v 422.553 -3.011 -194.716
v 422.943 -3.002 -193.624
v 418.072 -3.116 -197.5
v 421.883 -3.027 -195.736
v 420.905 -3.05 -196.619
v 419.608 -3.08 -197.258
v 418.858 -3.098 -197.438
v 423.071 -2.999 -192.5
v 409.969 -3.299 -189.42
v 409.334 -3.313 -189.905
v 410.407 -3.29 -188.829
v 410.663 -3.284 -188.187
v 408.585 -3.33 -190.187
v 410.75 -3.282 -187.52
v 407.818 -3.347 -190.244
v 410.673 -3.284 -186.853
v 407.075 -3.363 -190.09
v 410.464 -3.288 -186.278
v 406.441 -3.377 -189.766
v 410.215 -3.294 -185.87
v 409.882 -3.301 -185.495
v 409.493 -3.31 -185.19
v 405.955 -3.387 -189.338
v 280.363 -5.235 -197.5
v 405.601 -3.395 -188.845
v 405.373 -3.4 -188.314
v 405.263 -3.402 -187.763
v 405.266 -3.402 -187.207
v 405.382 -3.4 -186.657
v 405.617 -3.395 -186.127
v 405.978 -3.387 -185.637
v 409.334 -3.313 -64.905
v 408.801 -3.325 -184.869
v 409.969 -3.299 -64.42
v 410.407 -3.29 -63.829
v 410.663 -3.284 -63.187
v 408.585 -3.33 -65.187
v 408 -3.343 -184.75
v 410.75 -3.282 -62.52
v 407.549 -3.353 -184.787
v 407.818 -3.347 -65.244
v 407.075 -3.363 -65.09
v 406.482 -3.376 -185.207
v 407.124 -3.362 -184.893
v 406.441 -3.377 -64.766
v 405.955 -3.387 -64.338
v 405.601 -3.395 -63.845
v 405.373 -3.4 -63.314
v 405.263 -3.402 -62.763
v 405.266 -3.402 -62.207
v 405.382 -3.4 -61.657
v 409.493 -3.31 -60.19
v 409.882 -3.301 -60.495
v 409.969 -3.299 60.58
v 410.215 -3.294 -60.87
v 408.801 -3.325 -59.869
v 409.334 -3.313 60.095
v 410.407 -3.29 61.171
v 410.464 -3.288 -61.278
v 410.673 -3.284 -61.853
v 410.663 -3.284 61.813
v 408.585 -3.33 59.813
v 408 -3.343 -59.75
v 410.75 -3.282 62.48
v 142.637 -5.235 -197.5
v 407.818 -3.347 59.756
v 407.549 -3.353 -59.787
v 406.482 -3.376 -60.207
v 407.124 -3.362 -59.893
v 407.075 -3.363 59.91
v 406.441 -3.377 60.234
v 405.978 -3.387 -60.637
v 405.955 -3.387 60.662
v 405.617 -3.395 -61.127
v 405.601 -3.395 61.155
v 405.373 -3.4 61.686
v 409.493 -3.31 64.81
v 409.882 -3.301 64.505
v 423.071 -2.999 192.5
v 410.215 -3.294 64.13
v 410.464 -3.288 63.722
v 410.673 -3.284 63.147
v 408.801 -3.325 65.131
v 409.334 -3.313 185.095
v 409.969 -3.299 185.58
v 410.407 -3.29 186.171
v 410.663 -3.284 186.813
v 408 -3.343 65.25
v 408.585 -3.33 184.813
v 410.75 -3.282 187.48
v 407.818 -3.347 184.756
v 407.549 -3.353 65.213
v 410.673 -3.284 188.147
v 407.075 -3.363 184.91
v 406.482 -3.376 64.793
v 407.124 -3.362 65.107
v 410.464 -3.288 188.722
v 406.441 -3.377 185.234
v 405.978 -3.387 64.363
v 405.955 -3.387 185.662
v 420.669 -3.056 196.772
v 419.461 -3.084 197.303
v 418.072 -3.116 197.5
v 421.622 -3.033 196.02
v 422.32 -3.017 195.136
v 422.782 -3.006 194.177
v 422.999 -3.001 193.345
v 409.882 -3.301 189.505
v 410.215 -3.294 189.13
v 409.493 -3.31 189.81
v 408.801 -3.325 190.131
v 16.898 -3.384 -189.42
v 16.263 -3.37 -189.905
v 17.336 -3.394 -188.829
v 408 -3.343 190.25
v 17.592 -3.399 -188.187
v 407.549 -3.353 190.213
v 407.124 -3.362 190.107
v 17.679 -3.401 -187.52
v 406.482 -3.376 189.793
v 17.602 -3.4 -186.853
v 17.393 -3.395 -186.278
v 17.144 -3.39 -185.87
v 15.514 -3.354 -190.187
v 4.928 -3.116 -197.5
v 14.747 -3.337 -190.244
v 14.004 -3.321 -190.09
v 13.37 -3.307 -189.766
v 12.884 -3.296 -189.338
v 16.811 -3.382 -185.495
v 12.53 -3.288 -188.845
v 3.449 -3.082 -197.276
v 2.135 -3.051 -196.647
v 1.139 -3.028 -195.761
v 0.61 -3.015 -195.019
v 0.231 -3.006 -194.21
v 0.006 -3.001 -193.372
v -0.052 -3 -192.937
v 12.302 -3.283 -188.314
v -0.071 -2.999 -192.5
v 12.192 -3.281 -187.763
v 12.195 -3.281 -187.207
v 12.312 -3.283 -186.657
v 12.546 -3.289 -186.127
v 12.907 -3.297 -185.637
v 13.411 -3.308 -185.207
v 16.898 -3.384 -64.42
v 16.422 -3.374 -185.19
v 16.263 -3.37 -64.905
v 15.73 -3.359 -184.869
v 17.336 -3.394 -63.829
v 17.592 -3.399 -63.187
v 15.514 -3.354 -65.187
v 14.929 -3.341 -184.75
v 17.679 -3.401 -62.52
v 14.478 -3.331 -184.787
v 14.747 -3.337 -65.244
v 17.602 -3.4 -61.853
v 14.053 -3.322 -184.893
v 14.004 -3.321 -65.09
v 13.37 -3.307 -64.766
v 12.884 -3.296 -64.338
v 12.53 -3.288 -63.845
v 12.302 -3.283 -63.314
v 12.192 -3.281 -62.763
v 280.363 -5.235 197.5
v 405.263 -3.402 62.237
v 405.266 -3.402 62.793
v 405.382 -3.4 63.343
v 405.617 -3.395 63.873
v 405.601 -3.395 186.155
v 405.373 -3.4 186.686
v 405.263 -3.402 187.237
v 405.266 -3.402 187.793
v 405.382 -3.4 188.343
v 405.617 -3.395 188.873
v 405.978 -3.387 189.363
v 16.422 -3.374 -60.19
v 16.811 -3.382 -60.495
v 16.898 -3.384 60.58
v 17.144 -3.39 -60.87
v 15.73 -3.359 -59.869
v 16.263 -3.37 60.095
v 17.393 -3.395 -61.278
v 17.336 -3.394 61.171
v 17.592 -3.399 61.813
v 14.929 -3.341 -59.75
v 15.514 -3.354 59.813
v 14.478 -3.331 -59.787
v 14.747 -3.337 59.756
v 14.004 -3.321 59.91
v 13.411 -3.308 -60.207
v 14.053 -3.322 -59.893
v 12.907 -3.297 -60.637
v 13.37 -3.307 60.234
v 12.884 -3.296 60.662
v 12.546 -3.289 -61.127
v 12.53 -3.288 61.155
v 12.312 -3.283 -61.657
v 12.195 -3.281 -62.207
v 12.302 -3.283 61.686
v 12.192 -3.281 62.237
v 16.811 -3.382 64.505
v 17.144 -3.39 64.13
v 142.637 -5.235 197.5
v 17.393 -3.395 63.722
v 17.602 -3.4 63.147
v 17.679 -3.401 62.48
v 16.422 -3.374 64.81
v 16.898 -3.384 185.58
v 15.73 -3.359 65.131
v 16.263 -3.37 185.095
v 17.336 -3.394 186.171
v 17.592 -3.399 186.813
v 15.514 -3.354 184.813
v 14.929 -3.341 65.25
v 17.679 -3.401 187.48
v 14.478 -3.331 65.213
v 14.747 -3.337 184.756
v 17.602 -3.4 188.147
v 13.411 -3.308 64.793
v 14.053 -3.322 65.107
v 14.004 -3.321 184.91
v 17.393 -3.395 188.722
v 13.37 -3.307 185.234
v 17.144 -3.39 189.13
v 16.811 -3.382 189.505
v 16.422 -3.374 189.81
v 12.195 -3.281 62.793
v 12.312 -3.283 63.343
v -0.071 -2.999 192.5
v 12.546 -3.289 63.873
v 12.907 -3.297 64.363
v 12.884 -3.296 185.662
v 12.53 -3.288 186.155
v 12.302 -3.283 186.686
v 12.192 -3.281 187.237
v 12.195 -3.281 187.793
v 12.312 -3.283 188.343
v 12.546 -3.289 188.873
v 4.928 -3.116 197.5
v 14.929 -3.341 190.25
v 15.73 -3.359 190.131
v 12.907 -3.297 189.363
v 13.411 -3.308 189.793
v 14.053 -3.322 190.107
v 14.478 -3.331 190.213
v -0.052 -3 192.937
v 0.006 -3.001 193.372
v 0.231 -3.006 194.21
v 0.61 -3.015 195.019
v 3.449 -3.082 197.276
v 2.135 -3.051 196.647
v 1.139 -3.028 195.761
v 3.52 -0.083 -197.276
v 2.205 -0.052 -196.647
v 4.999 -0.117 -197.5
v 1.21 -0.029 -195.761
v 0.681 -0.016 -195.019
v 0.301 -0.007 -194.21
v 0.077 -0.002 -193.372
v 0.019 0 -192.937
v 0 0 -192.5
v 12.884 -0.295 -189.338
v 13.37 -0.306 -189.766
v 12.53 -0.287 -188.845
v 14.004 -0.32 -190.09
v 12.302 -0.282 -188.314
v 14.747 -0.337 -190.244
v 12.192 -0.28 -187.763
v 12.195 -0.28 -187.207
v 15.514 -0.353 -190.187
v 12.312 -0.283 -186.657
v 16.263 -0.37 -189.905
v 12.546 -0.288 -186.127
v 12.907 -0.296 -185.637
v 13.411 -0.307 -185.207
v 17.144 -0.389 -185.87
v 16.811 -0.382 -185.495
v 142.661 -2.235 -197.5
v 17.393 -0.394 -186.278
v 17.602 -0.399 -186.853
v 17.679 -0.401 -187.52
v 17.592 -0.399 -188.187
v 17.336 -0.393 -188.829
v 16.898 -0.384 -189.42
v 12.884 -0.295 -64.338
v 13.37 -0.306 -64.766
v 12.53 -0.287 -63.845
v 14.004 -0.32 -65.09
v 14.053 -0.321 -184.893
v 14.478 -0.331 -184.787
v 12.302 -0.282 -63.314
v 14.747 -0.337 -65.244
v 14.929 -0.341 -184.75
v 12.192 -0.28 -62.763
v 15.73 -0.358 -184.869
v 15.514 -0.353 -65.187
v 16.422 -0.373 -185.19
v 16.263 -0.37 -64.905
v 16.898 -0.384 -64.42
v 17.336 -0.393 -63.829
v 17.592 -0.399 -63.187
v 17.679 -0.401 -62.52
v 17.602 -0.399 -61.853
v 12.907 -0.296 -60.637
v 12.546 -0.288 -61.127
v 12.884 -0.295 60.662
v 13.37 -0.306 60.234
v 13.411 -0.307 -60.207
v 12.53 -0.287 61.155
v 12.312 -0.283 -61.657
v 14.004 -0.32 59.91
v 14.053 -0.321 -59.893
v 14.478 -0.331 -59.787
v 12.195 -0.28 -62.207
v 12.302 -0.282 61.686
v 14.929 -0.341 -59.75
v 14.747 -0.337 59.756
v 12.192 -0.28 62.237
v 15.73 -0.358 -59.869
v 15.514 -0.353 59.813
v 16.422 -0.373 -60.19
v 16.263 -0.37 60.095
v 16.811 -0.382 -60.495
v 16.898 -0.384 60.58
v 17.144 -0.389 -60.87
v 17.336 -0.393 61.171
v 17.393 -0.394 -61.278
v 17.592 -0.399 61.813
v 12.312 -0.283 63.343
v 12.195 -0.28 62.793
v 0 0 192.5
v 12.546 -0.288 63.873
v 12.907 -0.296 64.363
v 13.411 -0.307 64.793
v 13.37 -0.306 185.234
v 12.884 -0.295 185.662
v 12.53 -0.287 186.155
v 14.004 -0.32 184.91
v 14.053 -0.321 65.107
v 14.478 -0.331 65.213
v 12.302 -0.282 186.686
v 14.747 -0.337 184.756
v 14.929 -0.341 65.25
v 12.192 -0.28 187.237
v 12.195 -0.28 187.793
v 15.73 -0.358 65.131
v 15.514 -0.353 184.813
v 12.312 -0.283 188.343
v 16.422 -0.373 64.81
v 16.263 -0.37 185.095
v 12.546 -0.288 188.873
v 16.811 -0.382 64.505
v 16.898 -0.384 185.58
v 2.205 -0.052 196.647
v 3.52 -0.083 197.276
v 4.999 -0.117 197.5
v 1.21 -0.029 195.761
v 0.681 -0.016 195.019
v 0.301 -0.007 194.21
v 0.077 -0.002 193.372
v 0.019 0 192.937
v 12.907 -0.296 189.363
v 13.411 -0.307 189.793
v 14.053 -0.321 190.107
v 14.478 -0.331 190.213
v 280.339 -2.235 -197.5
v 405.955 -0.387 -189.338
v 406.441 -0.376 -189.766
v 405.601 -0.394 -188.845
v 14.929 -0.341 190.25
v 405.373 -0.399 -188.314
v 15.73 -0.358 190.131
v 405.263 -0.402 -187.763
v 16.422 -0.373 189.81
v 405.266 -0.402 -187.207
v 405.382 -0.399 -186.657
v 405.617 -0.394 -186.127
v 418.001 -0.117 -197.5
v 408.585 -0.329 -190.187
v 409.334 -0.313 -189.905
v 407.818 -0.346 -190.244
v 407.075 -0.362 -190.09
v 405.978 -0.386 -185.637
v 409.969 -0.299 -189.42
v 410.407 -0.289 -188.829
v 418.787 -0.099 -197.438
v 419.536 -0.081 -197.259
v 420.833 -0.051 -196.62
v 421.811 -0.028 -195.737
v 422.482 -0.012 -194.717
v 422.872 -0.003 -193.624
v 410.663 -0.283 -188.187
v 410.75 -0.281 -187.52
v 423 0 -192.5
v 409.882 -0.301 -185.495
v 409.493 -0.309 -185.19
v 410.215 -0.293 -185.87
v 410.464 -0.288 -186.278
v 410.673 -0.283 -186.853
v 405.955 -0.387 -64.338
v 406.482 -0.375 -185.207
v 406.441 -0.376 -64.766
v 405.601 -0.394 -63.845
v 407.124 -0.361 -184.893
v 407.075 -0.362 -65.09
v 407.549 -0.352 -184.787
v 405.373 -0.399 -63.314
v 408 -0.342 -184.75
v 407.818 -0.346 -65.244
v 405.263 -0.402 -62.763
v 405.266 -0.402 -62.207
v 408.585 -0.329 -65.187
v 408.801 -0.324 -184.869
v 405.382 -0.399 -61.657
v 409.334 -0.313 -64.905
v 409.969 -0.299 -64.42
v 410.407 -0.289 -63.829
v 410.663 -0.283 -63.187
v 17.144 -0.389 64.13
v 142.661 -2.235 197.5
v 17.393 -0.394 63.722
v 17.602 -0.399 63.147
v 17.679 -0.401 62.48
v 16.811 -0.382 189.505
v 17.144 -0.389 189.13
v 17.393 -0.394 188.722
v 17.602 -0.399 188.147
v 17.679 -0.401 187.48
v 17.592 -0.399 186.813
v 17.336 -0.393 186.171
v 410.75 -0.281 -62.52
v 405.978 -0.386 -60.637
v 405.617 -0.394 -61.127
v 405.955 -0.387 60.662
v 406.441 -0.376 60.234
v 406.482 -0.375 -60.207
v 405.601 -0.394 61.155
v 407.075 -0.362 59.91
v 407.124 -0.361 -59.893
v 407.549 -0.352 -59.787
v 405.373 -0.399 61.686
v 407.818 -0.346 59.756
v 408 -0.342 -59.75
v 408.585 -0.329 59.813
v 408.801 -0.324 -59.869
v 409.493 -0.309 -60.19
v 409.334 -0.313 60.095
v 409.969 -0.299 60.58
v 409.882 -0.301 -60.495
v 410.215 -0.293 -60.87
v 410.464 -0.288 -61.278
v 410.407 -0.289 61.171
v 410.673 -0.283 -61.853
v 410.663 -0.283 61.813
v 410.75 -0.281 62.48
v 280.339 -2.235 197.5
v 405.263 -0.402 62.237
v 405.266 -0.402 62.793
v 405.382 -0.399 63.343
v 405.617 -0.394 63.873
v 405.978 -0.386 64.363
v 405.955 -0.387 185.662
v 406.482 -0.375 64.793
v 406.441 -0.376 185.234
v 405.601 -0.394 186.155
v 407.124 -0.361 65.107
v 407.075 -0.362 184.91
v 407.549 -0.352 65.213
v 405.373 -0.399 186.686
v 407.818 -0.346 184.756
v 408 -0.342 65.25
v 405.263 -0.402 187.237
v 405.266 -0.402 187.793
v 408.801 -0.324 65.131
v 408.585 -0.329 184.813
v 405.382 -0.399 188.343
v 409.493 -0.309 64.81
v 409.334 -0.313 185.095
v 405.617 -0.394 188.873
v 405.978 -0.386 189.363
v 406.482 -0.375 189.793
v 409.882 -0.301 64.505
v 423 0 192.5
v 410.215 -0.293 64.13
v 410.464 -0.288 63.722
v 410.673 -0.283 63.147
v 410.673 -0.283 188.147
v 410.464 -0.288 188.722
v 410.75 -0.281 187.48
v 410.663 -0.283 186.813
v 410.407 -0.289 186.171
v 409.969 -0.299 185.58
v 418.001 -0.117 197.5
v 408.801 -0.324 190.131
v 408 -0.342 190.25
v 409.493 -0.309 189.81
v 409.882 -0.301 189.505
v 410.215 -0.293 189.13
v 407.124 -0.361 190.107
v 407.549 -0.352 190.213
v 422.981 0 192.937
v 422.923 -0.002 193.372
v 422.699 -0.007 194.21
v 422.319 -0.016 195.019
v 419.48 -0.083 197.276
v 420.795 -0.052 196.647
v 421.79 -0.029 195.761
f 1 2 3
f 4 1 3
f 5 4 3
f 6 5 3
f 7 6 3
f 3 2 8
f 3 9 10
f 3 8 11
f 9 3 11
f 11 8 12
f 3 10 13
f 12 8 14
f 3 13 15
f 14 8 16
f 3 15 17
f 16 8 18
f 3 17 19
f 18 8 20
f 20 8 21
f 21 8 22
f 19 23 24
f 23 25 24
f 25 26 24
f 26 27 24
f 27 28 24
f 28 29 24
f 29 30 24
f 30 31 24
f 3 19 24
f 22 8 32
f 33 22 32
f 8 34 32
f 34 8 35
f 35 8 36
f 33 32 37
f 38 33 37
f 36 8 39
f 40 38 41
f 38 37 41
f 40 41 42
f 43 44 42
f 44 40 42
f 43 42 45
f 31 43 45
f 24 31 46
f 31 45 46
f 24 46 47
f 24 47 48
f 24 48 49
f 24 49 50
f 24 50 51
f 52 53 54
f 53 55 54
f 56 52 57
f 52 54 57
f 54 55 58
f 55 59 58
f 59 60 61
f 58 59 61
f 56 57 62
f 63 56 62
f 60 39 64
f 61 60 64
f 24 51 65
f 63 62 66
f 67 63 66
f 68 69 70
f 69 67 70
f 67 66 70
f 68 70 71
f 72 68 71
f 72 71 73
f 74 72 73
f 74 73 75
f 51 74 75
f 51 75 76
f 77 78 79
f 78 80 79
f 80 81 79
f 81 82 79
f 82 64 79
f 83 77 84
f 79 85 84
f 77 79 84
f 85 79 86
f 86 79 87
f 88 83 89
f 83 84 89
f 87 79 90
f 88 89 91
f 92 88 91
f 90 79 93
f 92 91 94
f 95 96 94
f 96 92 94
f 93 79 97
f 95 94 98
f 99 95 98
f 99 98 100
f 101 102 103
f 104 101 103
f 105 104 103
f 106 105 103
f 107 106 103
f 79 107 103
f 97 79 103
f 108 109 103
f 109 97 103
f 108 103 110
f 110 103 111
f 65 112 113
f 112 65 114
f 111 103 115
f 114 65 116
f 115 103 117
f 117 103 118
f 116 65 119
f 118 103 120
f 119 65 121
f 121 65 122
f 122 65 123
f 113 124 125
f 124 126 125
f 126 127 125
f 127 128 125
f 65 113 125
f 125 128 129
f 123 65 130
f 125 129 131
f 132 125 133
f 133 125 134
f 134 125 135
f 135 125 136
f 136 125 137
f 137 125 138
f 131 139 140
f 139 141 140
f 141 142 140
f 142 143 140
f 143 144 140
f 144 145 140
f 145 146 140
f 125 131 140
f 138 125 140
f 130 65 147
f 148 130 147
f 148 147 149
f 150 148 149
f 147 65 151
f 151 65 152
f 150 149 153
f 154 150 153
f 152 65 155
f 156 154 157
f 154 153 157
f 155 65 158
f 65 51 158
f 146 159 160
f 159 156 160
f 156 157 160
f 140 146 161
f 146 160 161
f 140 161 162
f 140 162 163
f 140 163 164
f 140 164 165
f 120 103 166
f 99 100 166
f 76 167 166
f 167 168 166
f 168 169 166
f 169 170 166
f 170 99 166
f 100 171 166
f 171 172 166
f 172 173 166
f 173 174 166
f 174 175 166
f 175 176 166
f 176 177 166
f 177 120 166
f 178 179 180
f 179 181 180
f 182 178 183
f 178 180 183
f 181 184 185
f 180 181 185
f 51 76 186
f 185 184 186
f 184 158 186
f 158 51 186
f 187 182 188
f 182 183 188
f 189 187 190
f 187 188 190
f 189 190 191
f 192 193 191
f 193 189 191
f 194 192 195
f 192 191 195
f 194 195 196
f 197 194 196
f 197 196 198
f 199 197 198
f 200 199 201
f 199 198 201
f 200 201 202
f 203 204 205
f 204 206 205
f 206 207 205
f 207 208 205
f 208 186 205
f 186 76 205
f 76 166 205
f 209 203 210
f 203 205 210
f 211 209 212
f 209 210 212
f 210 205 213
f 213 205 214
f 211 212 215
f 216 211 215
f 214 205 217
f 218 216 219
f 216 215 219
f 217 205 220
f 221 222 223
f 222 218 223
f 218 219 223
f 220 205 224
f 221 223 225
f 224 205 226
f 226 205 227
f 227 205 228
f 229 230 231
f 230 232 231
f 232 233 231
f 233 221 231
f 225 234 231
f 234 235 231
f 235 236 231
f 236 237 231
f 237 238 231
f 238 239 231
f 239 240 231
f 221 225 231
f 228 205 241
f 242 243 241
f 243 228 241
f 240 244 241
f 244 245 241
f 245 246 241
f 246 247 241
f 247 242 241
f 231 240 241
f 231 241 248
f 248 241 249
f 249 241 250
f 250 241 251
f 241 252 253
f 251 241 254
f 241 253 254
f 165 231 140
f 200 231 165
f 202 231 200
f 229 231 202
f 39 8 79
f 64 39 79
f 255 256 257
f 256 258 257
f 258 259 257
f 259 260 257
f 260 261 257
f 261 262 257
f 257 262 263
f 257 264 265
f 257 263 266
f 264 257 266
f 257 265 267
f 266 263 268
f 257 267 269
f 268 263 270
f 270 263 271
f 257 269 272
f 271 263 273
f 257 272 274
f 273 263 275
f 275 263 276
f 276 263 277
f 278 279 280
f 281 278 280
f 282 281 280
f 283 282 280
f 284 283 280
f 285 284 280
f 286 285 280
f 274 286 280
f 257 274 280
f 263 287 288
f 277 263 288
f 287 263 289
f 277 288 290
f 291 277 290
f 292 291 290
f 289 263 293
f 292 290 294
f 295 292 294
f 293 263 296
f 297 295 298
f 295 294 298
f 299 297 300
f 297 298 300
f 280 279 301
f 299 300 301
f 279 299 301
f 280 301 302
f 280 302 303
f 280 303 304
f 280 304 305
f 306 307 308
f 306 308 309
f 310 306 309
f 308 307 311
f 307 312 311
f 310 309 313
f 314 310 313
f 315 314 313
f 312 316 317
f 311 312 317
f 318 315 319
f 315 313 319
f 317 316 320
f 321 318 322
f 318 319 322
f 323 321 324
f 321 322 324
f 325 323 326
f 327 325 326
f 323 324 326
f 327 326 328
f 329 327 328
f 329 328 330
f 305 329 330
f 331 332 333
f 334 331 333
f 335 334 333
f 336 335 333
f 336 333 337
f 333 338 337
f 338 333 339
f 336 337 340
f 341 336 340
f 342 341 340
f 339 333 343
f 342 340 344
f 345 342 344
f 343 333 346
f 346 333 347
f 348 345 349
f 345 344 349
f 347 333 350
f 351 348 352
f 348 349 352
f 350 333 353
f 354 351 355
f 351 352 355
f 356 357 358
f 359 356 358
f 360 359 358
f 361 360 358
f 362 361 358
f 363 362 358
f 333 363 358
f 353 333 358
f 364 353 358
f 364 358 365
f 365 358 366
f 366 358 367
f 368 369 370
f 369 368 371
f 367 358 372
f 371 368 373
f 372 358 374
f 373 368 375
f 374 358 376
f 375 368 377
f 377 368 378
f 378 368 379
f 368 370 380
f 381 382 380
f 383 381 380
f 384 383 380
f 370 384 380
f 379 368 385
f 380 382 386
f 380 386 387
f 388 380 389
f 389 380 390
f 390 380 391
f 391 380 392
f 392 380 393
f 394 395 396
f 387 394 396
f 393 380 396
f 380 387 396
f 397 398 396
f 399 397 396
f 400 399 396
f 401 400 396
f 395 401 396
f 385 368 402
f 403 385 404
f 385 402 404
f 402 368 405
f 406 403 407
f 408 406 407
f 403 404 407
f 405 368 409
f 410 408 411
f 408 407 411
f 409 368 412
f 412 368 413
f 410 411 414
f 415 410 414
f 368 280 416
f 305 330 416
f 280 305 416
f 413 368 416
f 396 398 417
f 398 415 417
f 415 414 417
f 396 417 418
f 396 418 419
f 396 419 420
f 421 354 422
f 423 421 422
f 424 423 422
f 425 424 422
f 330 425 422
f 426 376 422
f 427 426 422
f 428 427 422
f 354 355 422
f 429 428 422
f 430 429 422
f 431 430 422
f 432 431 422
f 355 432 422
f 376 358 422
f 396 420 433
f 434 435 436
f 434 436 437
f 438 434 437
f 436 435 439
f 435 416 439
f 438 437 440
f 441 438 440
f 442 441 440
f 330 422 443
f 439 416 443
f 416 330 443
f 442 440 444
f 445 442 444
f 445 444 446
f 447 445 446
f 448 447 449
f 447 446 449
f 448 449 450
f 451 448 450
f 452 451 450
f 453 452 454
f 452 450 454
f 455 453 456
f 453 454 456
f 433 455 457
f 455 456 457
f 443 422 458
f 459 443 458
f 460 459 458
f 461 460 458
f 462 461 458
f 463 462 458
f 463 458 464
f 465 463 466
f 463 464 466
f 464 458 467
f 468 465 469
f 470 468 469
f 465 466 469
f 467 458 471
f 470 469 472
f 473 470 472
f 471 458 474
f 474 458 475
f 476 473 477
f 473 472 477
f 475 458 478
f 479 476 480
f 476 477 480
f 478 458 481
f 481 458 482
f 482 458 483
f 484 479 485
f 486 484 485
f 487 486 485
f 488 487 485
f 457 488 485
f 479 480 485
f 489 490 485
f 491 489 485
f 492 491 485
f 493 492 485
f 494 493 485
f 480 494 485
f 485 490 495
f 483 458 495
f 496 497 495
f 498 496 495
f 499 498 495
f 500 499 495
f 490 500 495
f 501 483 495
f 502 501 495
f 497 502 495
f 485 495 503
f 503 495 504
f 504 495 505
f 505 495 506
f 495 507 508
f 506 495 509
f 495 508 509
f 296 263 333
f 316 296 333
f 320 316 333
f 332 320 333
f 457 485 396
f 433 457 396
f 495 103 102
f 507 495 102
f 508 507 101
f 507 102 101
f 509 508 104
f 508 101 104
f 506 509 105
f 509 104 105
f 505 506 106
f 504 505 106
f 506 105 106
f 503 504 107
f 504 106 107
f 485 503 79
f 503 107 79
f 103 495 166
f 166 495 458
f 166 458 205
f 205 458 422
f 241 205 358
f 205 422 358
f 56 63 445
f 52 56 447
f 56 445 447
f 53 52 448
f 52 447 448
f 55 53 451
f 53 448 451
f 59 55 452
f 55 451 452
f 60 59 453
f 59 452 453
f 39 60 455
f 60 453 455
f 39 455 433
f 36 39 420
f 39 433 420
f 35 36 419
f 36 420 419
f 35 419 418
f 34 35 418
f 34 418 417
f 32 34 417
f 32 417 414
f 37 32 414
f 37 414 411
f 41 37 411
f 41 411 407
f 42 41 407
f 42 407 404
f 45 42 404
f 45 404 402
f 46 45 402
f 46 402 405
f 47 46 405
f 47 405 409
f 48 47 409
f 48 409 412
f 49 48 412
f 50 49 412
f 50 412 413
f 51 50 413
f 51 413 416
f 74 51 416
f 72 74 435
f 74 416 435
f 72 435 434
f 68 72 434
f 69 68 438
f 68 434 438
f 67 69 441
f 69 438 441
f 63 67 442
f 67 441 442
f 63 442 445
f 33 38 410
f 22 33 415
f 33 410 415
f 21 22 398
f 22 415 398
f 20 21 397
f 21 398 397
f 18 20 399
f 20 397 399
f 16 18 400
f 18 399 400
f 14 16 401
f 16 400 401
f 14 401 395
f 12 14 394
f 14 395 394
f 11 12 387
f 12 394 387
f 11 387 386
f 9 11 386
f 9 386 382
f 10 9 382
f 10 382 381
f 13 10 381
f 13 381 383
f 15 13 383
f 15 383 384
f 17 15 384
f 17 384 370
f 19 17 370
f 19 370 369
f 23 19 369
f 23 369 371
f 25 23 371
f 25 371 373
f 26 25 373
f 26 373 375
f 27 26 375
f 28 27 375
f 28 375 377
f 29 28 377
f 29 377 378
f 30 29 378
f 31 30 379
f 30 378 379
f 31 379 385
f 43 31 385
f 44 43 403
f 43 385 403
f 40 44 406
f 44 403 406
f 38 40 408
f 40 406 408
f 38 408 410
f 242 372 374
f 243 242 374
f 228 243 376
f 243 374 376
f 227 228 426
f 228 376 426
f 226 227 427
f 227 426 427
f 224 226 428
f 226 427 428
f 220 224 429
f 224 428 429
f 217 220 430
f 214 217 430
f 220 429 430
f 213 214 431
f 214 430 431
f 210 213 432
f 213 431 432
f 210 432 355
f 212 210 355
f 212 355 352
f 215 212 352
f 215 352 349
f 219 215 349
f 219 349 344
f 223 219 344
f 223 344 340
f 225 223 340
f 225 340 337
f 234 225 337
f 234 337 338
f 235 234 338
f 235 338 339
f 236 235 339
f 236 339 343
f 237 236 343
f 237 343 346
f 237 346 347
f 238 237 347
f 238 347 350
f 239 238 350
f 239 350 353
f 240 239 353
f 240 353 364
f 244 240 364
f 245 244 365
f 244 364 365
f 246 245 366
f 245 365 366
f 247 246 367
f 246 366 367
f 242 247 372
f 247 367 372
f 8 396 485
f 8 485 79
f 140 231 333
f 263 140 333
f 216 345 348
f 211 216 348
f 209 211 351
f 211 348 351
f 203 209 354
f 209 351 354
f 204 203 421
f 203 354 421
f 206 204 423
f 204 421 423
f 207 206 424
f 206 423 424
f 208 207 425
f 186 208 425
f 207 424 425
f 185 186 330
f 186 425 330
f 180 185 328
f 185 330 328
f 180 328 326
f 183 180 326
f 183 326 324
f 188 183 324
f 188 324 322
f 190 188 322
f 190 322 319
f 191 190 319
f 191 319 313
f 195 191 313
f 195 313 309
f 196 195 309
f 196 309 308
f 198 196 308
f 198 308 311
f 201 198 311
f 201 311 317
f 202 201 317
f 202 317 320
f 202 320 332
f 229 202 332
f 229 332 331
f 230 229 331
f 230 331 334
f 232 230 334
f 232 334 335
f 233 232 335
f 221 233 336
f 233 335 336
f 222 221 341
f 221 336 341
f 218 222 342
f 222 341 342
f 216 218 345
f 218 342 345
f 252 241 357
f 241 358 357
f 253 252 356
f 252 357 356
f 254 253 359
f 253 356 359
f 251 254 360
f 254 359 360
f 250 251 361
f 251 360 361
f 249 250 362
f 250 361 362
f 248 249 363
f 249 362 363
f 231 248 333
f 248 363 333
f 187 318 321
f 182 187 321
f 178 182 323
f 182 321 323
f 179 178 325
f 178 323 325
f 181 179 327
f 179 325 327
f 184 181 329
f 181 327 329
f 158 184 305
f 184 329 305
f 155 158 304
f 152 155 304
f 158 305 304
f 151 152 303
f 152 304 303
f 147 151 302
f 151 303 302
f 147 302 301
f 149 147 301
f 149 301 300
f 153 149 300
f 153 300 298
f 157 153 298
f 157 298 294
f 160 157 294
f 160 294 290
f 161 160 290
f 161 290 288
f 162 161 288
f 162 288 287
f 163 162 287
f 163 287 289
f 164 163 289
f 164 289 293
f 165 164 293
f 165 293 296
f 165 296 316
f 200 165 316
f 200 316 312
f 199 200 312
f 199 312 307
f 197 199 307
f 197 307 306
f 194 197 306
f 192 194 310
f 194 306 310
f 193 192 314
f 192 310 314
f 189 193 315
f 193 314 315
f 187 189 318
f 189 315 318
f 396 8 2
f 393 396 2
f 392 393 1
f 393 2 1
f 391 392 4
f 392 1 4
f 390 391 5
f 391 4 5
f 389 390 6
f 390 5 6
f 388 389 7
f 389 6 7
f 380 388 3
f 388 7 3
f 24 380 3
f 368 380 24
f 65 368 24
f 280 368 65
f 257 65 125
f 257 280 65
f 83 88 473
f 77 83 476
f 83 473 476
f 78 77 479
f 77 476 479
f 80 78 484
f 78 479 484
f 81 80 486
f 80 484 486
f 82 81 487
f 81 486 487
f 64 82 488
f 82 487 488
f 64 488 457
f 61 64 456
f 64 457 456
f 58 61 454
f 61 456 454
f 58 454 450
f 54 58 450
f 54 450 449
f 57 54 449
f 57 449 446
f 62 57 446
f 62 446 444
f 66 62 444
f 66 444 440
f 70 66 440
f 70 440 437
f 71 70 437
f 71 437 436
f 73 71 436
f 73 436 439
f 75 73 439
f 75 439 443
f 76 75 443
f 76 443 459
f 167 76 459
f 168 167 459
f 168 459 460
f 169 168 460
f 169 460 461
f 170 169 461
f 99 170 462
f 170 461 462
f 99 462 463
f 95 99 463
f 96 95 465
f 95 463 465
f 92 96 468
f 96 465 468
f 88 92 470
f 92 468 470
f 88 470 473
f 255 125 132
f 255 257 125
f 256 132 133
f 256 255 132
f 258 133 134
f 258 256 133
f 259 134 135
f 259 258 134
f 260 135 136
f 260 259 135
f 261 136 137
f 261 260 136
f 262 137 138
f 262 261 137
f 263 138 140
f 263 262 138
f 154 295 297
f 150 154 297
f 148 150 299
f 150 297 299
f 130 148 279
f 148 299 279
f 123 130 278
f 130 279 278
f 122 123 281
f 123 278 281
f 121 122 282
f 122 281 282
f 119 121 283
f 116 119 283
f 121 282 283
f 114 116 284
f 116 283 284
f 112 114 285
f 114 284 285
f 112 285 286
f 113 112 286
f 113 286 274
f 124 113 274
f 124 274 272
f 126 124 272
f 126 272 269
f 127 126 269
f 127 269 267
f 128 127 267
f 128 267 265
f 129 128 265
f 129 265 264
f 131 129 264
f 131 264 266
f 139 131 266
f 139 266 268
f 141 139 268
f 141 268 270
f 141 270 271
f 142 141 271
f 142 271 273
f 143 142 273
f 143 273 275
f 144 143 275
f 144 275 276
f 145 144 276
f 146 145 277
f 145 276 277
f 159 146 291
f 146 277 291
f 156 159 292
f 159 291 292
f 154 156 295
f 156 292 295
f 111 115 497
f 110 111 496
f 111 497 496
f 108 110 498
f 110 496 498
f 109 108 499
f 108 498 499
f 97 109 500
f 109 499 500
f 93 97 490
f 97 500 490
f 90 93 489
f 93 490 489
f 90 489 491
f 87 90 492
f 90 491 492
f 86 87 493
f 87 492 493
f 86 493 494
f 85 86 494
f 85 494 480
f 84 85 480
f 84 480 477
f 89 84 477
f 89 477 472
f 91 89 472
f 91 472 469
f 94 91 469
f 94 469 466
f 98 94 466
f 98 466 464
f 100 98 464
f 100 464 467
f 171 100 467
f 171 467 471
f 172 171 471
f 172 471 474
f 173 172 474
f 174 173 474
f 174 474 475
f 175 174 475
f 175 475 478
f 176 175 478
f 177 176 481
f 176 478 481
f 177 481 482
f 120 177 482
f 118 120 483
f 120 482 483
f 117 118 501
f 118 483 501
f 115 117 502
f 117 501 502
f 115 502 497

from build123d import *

# Parameters (mm, degrees)
EXTRUS_O_FINA1_DEPTH  = 197.5
FILETE1_R             = 5
ESBO_O2_R             = 2.75
CORTE_EXTRUS_O1_DEPTH = 467.932004441
PADR_O_LINEAR2_COUNT  = 4
PADR_O_LINEAR2_PITCH  = 125


with BuildPart() as part:
    # Esboço1 → Extrusão-Fina1 (new, symmetric)
    with BuildSketch(Plane.XY):
        with BuildLine():
            ThreePointArc((0, 0), (211.5, -2.5), (423, 0))
            Line((423, 0), (423.070912078, -2.999161796))
            ThreePointArc((423.070912078, -2.999161796), (211.5, -5.5), (-0.070912078, -2.999161796))
            Line((-0.070912078, -2.999161796), (0, 0))
        make_face()
    extrude(amount=EXTRUS_O_FINA1_DEPTH, both=True)

    # Filete1
    filete1_edges = [part.edges().sort_by_distance(p)[0] for p in [
        (-0.035456039, -1.499580898, 197.5),
        (-0.035456039, -1.499580898, -197.5),
        (423.035456039, -1.499580898, -197.5),
        (423.035456039, -1.499580898, 197.5),
    ]]
    fillet(filete1_edges, radius=FILETE1_R)

    # Esboço2 → Corte-extrusão1 (cut, through all)
    with BuildSketch(Plane(origin=(0, 0, 0), x_dir=(1, 0, 0), z_dir=(0, 1, 0))):
        with Locations(Location((14.929087922, -187.5, 0), (0, 0, 270))):
            Circle(ESBO_O2_R)
        with Locations(Location((408, -187.5, 0), (0, 0, 270))):
            Circle(ESBO_O2_R)
    corte_extrus_o1 = extrude(amount=-CORTE_EXTRUS_O1_DEPTH, mode=Mode.SUBTRACT)

    # Padrão linear2: Corte-extrusão1 ×4
    with Locations(*[(0, 0, -i * PADR_O_LINEAR2_PITCH) for i in range(1, PADR_O_LINEAR2_COUNT)]):
        add(corte_extrus_o1, mode=Mode.SUBTRACT)


solid = part.part
